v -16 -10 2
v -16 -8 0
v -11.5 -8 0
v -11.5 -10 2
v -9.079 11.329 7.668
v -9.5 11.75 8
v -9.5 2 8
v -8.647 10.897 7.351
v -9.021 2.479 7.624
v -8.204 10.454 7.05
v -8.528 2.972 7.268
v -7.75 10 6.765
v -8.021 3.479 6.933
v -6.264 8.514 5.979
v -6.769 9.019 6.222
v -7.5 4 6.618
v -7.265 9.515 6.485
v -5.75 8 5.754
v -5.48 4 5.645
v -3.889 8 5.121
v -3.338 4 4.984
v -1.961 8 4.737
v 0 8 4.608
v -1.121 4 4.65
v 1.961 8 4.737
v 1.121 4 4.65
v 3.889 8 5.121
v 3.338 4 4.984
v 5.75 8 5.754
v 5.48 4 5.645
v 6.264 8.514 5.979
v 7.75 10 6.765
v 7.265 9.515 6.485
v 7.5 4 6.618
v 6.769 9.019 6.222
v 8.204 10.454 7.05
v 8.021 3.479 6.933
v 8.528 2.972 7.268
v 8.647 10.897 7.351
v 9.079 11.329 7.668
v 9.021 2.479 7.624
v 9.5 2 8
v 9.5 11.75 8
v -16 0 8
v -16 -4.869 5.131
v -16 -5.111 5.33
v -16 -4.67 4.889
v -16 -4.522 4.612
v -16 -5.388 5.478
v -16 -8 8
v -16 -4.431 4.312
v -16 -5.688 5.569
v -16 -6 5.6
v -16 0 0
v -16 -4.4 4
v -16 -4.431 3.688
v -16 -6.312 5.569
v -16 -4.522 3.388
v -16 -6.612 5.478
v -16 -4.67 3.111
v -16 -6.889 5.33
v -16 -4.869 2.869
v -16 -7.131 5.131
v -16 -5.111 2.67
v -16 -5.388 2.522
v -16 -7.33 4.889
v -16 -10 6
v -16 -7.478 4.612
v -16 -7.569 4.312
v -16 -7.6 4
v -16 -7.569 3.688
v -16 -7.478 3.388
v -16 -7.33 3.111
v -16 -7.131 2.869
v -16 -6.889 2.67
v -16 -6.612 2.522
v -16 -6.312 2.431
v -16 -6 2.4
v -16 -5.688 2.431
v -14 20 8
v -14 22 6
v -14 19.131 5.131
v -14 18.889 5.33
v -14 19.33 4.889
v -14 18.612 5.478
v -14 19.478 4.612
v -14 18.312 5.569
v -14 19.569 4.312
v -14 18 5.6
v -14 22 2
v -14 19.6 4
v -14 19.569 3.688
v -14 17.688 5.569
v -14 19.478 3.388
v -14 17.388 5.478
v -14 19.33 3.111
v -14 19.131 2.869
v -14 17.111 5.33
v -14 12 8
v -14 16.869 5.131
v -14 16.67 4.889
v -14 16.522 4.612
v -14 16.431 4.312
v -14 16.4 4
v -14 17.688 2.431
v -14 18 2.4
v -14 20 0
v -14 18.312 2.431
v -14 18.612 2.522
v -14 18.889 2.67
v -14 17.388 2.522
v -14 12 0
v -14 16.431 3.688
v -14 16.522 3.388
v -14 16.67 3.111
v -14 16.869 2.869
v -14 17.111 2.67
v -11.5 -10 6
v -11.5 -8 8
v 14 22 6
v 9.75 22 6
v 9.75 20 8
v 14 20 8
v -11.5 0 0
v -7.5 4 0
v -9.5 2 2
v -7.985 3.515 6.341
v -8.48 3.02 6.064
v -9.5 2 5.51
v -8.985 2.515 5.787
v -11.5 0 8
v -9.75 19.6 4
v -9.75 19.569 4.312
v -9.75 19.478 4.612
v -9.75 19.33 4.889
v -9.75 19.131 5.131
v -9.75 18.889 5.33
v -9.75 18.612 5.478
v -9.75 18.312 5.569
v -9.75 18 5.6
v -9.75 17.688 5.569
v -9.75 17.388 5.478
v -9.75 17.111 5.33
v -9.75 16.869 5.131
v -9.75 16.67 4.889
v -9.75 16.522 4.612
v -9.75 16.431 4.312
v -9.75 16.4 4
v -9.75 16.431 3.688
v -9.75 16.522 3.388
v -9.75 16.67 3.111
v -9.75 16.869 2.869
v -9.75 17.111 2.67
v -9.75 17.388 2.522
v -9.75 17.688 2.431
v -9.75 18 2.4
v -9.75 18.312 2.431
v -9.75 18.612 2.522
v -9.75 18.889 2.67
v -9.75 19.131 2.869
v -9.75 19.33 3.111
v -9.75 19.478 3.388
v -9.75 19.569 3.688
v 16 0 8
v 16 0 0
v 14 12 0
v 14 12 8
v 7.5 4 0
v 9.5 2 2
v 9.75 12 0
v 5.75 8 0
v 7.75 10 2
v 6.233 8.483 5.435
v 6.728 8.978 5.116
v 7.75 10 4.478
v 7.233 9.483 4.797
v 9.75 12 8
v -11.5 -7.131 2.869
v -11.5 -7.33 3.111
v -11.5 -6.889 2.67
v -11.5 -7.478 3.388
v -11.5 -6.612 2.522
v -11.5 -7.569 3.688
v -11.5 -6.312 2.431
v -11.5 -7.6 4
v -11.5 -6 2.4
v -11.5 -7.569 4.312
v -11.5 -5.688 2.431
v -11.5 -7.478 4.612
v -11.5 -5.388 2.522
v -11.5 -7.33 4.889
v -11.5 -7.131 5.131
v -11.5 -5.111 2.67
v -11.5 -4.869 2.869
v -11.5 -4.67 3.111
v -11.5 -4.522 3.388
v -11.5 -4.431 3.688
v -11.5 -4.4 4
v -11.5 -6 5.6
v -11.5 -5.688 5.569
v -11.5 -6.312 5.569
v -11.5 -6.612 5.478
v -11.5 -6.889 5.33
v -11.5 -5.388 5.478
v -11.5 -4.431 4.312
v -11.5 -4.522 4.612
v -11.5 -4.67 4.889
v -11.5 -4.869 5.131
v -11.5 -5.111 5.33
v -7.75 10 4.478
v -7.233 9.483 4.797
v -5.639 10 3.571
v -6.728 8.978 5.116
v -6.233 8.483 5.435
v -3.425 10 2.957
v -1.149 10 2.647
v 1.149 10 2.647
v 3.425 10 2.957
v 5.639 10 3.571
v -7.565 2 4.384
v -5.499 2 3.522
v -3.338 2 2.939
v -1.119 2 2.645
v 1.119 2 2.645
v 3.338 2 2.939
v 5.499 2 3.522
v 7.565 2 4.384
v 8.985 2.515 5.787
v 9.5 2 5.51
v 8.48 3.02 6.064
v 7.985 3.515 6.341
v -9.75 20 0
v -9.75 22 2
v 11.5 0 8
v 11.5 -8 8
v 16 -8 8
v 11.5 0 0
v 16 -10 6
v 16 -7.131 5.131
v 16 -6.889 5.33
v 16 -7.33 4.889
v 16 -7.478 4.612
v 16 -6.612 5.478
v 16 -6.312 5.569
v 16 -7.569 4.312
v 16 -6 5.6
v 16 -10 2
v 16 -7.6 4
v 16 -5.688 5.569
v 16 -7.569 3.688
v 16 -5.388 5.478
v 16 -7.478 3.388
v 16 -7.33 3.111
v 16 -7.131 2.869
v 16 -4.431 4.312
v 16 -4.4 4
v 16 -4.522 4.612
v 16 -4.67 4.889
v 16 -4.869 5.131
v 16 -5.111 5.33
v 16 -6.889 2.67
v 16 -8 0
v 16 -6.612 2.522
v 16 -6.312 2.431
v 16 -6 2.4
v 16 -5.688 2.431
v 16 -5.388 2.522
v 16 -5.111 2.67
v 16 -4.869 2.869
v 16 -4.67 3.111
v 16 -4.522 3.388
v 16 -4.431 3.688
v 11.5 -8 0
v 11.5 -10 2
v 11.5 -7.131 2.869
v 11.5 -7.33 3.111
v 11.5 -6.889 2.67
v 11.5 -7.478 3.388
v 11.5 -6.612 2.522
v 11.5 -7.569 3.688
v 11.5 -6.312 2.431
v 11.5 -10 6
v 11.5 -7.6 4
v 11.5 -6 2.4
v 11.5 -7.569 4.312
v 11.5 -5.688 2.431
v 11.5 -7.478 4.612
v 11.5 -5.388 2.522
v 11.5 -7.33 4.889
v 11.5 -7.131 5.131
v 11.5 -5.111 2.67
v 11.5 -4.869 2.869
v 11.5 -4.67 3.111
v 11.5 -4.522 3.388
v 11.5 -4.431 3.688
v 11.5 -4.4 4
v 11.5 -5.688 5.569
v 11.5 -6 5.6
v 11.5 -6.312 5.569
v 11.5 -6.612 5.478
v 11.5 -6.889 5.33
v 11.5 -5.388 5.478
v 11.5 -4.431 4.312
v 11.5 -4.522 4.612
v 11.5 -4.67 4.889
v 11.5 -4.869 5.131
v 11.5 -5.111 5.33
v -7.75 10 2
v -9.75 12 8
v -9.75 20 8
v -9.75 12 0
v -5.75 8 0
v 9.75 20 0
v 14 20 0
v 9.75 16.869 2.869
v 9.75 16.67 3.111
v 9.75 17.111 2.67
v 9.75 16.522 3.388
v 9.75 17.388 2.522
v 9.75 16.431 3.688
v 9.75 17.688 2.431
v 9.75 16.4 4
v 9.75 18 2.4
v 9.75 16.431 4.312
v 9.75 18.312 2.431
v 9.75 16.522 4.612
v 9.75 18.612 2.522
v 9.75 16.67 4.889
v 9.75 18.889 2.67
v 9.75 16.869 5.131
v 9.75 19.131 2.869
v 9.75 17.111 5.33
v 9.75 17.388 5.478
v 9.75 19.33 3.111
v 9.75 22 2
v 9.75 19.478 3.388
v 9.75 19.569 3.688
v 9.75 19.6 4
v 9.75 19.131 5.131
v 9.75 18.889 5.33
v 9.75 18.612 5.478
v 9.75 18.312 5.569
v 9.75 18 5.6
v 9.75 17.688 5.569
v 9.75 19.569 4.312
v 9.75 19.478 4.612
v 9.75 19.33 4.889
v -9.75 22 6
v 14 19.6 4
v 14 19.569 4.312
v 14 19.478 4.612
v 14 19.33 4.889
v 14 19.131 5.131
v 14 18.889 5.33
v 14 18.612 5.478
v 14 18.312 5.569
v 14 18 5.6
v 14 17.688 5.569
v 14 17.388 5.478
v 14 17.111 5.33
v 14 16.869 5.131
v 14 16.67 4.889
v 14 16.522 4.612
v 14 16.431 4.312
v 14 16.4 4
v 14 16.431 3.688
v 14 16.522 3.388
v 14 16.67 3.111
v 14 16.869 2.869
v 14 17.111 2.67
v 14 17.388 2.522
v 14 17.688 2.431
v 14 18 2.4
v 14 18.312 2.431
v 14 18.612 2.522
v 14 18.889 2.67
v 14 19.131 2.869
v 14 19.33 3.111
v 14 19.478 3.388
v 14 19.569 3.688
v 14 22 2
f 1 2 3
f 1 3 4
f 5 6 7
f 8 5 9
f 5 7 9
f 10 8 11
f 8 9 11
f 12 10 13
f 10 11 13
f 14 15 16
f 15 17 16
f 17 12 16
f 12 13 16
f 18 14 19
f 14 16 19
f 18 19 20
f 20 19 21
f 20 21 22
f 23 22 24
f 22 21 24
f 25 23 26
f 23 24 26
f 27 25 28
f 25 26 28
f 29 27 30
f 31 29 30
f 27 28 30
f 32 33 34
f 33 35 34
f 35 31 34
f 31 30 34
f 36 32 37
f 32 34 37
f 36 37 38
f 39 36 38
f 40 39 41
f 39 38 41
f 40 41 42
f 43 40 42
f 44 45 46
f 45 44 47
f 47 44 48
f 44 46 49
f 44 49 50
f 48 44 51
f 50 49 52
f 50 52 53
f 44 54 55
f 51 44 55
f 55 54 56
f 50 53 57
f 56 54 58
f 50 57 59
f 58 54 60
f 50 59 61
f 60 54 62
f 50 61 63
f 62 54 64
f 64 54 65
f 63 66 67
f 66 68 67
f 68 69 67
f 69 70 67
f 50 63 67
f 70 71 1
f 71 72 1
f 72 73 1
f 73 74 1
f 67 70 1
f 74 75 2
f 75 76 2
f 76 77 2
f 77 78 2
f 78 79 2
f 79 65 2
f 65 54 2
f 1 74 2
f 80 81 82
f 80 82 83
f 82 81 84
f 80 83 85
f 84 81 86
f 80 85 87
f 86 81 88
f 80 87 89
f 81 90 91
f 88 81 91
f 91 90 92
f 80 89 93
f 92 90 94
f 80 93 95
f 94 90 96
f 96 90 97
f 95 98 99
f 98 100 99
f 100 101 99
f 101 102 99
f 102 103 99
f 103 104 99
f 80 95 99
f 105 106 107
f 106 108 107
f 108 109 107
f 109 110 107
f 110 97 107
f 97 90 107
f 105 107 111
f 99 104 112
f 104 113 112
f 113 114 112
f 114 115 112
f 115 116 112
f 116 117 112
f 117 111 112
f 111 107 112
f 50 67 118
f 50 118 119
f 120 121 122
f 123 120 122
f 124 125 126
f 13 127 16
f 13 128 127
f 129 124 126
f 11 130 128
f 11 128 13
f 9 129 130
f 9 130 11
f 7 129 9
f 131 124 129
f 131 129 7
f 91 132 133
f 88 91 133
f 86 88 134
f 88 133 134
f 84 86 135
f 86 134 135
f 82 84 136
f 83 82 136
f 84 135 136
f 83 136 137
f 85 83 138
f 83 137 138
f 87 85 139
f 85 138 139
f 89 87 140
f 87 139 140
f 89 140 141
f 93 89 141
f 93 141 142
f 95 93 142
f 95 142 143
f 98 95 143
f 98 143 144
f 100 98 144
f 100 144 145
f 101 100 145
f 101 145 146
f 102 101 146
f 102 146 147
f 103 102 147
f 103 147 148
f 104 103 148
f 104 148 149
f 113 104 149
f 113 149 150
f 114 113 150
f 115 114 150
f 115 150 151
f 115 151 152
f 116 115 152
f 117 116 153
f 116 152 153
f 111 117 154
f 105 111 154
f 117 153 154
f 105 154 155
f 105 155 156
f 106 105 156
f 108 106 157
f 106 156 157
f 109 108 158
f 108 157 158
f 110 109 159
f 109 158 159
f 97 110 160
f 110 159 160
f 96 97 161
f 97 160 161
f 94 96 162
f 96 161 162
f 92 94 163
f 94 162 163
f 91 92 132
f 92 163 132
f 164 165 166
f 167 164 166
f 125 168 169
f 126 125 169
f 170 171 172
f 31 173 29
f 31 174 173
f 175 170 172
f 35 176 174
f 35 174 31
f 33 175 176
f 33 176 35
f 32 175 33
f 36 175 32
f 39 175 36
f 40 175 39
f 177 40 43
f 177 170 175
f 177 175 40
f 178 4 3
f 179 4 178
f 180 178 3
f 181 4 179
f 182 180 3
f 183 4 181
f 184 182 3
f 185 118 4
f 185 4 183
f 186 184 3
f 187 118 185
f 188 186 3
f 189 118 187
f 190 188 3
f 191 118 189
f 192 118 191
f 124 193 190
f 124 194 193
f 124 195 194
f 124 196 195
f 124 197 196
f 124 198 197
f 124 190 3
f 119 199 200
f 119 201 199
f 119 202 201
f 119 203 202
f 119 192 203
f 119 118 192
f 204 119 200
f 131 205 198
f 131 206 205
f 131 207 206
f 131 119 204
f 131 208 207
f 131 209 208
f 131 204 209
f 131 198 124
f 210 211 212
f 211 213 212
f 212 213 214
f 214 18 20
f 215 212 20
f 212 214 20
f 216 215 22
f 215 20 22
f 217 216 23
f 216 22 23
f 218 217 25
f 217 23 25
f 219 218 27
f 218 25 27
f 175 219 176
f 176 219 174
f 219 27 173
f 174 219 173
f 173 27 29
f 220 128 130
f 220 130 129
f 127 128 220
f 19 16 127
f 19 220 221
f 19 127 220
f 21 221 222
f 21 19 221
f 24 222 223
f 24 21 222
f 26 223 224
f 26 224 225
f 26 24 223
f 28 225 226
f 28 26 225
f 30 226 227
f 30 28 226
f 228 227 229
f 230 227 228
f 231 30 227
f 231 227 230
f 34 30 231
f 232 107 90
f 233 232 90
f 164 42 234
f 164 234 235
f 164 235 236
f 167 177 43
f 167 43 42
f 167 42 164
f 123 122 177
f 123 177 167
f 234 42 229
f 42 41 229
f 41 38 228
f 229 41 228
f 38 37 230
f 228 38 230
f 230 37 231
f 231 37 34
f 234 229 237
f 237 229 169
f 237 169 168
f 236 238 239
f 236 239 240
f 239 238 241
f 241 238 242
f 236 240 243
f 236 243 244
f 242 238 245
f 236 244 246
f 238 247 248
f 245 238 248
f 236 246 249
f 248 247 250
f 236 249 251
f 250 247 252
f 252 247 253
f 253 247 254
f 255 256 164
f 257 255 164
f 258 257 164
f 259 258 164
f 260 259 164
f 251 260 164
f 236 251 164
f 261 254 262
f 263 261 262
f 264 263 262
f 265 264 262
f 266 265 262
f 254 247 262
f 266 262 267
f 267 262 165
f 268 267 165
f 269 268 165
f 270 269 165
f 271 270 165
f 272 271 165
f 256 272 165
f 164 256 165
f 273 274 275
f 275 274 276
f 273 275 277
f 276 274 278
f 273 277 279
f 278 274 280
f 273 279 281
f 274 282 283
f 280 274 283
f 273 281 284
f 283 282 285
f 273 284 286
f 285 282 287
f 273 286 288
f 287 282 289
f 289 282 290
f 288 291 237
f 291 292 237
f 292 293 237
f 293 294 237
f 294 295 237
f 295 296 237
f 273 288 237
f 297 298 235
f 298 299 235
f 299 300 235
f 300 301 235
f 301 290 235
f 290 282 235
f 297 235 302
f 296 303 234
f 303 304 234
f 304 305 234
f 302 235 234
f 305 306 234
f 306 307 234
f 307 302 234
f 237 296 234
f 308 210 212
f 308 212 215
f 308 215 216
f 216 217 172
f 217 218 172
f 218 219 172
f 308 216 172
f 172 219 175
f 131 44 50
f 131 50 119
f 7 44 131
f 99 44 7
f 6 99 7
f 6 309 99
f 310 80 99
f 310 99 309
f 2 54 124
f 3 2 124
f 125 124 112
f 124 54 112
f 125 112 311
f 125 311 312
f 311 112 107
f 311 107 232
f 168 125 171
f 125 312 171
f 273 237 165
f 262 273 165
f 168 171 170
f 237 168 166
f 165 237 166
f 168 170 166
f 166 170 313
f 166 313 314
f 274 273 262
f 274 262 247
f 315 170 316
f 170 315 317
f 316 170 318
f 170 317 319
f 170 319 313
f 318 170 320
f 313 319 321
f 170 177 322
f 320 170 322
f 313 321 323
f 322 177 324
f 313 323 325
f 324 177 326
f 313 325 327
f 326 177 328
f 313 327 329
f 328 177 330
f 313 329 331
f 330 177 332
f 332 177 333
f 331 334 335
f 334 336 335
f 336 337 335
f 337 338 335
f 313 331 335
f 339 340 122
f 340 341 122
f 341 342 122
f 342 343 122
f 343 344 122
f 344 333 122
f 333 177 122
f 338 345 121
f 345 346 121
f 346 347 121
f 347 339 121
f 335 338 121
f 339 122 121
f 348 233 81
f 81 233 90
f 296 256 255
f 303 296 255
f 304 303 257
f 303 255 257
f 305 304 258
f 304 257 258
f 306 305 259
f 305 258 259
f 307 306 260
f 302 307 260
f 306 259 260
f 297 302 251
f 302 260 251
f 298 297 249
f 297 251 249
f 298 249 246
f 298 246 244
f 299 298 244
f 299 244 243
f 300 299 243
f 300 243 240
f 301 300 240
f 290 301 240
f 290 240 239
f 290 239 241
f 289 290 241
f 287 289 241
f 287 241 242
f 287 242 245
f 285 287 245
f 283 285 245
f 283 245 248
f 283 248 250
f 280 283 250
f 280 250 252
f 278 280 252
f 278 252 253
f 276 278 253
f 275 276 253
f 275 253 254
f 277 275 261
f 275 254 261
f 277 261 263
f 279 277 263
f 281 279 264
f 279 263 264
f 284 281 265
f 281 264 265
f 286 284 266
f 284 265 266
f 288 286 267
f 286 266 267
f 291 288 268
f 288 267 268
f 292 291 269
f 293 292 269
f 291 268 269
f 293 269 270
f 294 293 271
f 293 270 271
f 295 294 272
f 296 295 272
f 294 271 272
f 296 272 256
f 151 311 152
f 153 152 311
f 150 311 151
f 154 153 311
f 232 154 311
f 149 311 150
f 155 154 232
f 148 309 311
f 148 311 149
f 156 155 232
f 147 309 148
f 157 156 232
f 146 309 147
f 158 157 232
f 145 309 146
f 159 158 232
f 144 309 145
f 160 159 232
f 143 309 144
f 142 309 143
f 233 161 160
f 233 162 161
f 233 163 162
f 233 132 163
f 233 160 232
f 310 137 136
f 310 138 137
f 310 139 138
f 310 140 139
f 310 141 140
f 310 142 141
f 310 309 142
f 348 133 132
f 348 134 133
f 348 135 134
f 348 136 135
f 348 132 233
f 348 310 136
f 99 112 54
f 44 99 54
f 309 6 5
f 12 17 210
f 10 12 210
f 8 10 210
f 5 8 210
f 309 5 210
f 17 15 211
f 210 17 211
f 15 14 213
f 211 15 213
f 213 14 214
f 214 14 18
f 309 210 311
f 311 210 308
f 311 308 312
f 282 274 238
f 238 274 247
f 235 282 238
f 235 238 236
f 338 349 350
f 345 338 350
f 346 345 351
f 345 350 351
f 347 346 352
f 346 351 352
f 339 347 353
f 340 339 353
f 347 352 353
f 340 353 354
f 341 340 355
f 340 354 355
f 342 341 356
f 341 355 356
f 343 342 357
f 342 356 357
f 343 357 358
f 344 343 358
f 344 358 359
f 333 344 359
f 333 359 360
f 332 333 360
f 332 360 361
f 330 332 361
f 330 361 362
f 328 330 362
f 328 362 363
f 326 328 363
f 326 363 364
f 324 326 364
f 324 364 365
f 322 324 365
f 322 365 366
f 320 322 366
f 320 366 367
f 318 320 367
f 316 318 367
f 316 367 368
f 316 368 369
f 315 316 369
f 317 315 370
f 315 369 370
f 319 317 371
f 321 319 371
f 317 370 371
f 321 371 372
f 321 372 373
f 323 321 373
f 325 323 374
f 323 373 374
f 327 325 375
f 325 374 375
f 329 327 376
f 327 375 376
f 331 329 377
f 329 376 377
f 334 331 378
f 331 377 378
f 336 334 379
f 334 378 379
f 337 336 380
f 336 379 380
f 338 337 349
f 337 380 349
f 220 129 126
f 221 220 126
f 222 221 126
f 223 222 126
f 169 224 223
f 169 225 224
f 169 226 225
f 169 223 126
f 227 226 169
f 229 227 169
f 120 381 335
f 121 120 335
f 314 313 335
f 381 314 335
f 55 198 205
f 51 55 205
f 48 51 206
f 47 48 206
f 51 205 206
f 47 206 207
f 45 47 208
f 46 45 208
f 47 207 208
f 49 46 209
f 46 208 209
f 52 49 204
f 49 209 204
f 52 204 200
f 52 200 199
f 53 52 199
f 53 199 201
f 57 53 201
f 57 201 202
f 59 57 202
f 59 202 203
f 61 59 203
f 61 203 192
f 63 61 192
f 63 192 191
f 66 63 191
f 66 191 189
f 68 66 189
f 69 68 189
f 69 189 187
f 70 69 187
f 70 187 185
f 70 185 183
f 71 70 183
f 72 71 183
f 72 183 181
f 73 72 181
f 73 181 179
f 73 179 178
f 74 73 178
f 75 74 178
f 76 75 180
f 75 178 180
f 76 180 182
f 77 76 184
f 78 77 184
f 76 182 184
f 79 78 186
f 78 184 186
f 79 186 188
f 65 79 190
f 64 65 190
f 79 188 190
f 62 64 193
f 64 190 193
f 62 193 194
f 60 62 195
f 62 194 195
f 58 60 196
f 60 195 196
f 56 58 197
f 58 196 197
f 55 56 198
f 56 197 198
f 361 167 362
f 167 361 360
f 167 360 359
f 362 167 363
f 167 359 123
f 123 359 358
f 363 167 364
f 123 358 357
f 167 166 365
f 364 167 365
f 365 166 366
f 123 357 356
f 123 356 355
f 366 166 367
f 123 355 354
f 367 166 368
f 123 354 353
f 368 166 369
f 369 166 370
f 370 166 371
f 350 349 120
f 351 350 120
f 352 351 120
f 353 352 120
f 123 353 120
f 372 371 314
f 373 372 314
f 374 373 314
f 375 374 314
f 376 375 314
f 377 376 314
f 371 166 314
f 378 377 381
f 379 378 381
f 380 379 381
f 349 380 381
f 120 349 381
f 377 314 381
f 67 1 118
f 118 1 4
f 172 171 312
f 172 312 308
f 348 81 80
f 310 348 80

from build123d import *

# Parameters (mm, degrees)
F1_DEPTH      = 8
F2_W          = 19.5
F2_H          = 12
F2_W_2        = 23
F3_DEPTH      = 8
F4_R          = 1.6
F5_DEPTH      = 32
F6_R          = 1.6
F7_DEPTH      = 28
F8_SIZE       = 2
F10_DEPTH     = 9.751
F11_T1_DEPTH  = 14.7867319519
F11_T3_DEPTH  = 14.7867319519
F11_T5_DEPTH  = 14.5367319519
F11_T7_DEPTH  = 14.5367319519
F11_T12_DEPTH = 25.7867319519
F11_T18_DEPTH = 29.2867319519
F11_T24_ANGLE = 117.8974179381
F11_T30_ANGLE = 101.5178089871


# Not quite as in the source:
# - a fillet or chamfer that OpenCascade refuses, or shapes differently, is made with other operations: its cross-section is extruded or revolved along the edge and cut away or added


with BuildPart() as f1:
    # F0 (on Top) → F1 (new body)
    with BuildSketch(Plane.XY):
        Polygon((14, 22), (-14, 22), (-14, 12), (-16, 0), (-16, -10), (16, -10), (16, 0), (14, 12), align=None)
    extrude(amount=F1_DEPTH)

    # F2 (on face) → F3 (cut, through all)
    with BuildSketch(Plane.XY.offset(8)):
        with Locations((0, 16)):
            Rectangle(F2_W, F2_H)
        with Locations((0, -4)):
            Rectangle(F2_W_2, F2_H)
    extrude(amount=-F3_DEPTH, mode=Mode.SUBTRACT)

    # F4 (on face) → F5 (cut, through all)
    with BuildSketch(Plane.YZ.offset(16)):
        with Locations((-6, 4)):
            Circle(F4_R)
    extrude(amount=-F5_DEPTH, mode=Mode.SUBTRACT)

    # F6 (on face) → F7 (cut, through all)
    with BuildSketch(Plane.YZ.offset(14)):
        with Locations((18, 4)):
            Circle(F6_R)
    extrude(amount=-F7_DEPTH, mode=Mode.SUBTRACT)

    # F8
    f8_edges = [f1.edges().sort_by_distance(p)[0] for p in [
        (9.75, 10, 4),
        (-9.75, 10, 4),
        (11.5, 2, 4),
        (-11.5, 2, 4),
    ]]
    chamfer(f8_edges, length=F8_SIZE)

    # F9 (on face) → F10 (cut, through all)
    with BuildSketch(Plane.XZ.offset(-2)):
        with BuildLine():
            Line((9.5, 8), (-9.5, 8))
            ThreePointArc((-9.5, 8), (0, 4.6081867662), (9.5, 8))
        make_face()
    extrude(amount=-F10_DEPTH, mode=Mode.SUBTRACT)

    # F11: chamfer of 2 on 12 edges, made by hand

    # F11_s2 → F11_t1 (cut)
    with BuildSketch(Plane.YZ.offset(-21.1433659759)):
        Polygon((-10, 6), (-8, 8), (-10, 8), align=None)
        Polygon((-8, 0), (-10, 2), (-10, 0), align=None)
    extrude(amount=F11_T1_DEPTH, mode=Mode.SUBTRACT)

    # F11_s4 → F11_t3 (cut)
    with BuildSketch(Plane.YZ.offset(6.3566340241)):
        Polygon((-10, 6), (-8, 8), (-10, 8), align=None)
        Polygon((-8, 0), (-10, 2), (-10, 0), align=None)
    extrude(amount=F11_T3_DEPTH, mode=Mode.SUBTRACT)

    # F11_s6 → F11_t5 (cut)
    with BuildSketch(Plane.YZ.offset(4.6066340241)):
        Polygon((22, 6), (20, 8), (22, 8), align=None)
        Polygon((20, 0), (22, 2), (22, 0), align=None)
    extrude(amount=F11_T5_DEPTH, mode=Mode.SUBTRACT)

    # F11_s8 → F11_t7 (cut)
    with BuildSketch(Plane.YZ.offset(-19.1433659759)):
        Polygon((20, 0), (22, 2), (22, 0), align=None)
        Polygon((22, 6), (20, 8), (22, 8), align=None)
    extrude(amount=F11_T7_DEPTH, mode=Mode.SUBTRACT)


with BuildPart() as f11_tool10:
    # F11_s11 → F11_t12 (new body)
    with BuildSketch(Plane.YZ.offset(-12.8933659759)):
        Polygon((8, 0), (10, 2), (10, 0), align=None)
    extrude(amount=F11_T12_DEPTH)

    split(bisect_by=Plane(origin=(-1.125, 1.125, 0), x_dir=(0, 0, 1), z_dir=(-0.7071067812, 0.7071067812, 0)), keep=Keep.TOP)

    split(bisect_by=Plane(origin=(1.125, 1.125, 0), x_dir=(0, 0, 1), z_dir=(0.7071067812, 0.7071067812, 0)), keep=Keep.TOP)


with BuildPart() as f1_1:
    add(f1.part)

    # F11_t9: cut F11_tool10
    add(f11_tool10.part, mode=Mode.SUBTRACT)


with BuildPart() as f11_tool16:
    # F11_s17 → F11_t18 (new body)
    with BuildSketch(Plane.YZ.offset(14.6433659759)):
        Polygon((4, 0), (2, 2), (2, 0), align=None)
    extrude(amount=-F11_T18_DEPTH)

    split(bisect_by=Plane(origin=(5.75, 5.75, 0), x_dir=(0, 0, 1), z_dir=(-0.7071067812, -0.7071067812, 0)), keep=Keep.TOP)

    split(bisect_by=Plane(origin=(-5.75, 5.75, 0), x_dir=(0, 0, 1), z_dir=(0.7071067812, -0.7071067812, 0)), keep=Keep.TOP)


with BuildPart() as f1_2:
    add(f1_1.part)

    # F11_t15: cut F11_tool16
    add(f11_tool16.part, mode=Mode.SUBTRACT)


with BuildPart() as f11_tool22:
    # F11_s23 → F11_t24 (revolve)
    with BuildSketch(Plane(origin=(-8.664727501, 0, 14.3913305034), x_dir=(0, 1, 0), z_dir=(-0.5158052023, 0, 0.8567058966))):
        Polygon((2, 6.8859952574), (4, 4.8859952574), (2, 4.8859952574), align=None)
    revolve(axis=Axis((0, 2, 19.6081867662), (0, -1, 0)), revolution_arc=F11_T24_ANGLE)

    split(bisect_by=Plane(origin=(5.75, 5.75, 0), x_dir=(0, 0, 1), z_dir=(-0.7071067812, -0.7071067812, 0)), keep=Keep.TOP)

    split(bisect_by=Plane(origin=(-5.75, 5.75, 0), x_dir=(0, 0, 1), z_dir=(0.7071067812, -0.7071067812, 0)), keep=Keep.TOP)


with BuildPart() as f1_3:
    add(f1_2.part)

    # F11_t21: cut F11_tool22
    add(f11_tool22.part, mode=Mode.SUBTRACT)


with BuildPart() as f11_tool28:
    # F11_s29 → F11_t30 (revolve)
    with BuildSketch(Plane(origin=(-9.6066653022, 0, 11.7617013204), x_dir=(0, 1, 0), z_dir=(-0.6325849704, 0, 0.7744909652))):
        Polygon((10, 4.596155754), (8, 2.596155754), (10, 2.596155754), align=None)
    revolve(axis=Axis((0, 10, 19.6081867662), (0, -1, 0)), revolution_arc=F11_T30_ANGLE)

    split(bisect_by=Plane(origin=(-1.125, 1.125, 0), x_dir=(0, 0, 1), z_dir=(-0.7071067812, 0.7071067812, 0)), keep=Keep.TOP)

    split(bisect_by=Plane(origin=(1.125, 1.125, 0), x_dir=(0, 0, 1), z_dir=(0.7071067812, 0.7071067812, 0)), keep=Keep.TOP)


with BuildPart() as f1_4:
    add(f1_3.part)

    # F11_t27: cut F11_tool28
    add(f11_tool28.part, mode=Mode.SUBTRACT)


solid = f1_4.part
